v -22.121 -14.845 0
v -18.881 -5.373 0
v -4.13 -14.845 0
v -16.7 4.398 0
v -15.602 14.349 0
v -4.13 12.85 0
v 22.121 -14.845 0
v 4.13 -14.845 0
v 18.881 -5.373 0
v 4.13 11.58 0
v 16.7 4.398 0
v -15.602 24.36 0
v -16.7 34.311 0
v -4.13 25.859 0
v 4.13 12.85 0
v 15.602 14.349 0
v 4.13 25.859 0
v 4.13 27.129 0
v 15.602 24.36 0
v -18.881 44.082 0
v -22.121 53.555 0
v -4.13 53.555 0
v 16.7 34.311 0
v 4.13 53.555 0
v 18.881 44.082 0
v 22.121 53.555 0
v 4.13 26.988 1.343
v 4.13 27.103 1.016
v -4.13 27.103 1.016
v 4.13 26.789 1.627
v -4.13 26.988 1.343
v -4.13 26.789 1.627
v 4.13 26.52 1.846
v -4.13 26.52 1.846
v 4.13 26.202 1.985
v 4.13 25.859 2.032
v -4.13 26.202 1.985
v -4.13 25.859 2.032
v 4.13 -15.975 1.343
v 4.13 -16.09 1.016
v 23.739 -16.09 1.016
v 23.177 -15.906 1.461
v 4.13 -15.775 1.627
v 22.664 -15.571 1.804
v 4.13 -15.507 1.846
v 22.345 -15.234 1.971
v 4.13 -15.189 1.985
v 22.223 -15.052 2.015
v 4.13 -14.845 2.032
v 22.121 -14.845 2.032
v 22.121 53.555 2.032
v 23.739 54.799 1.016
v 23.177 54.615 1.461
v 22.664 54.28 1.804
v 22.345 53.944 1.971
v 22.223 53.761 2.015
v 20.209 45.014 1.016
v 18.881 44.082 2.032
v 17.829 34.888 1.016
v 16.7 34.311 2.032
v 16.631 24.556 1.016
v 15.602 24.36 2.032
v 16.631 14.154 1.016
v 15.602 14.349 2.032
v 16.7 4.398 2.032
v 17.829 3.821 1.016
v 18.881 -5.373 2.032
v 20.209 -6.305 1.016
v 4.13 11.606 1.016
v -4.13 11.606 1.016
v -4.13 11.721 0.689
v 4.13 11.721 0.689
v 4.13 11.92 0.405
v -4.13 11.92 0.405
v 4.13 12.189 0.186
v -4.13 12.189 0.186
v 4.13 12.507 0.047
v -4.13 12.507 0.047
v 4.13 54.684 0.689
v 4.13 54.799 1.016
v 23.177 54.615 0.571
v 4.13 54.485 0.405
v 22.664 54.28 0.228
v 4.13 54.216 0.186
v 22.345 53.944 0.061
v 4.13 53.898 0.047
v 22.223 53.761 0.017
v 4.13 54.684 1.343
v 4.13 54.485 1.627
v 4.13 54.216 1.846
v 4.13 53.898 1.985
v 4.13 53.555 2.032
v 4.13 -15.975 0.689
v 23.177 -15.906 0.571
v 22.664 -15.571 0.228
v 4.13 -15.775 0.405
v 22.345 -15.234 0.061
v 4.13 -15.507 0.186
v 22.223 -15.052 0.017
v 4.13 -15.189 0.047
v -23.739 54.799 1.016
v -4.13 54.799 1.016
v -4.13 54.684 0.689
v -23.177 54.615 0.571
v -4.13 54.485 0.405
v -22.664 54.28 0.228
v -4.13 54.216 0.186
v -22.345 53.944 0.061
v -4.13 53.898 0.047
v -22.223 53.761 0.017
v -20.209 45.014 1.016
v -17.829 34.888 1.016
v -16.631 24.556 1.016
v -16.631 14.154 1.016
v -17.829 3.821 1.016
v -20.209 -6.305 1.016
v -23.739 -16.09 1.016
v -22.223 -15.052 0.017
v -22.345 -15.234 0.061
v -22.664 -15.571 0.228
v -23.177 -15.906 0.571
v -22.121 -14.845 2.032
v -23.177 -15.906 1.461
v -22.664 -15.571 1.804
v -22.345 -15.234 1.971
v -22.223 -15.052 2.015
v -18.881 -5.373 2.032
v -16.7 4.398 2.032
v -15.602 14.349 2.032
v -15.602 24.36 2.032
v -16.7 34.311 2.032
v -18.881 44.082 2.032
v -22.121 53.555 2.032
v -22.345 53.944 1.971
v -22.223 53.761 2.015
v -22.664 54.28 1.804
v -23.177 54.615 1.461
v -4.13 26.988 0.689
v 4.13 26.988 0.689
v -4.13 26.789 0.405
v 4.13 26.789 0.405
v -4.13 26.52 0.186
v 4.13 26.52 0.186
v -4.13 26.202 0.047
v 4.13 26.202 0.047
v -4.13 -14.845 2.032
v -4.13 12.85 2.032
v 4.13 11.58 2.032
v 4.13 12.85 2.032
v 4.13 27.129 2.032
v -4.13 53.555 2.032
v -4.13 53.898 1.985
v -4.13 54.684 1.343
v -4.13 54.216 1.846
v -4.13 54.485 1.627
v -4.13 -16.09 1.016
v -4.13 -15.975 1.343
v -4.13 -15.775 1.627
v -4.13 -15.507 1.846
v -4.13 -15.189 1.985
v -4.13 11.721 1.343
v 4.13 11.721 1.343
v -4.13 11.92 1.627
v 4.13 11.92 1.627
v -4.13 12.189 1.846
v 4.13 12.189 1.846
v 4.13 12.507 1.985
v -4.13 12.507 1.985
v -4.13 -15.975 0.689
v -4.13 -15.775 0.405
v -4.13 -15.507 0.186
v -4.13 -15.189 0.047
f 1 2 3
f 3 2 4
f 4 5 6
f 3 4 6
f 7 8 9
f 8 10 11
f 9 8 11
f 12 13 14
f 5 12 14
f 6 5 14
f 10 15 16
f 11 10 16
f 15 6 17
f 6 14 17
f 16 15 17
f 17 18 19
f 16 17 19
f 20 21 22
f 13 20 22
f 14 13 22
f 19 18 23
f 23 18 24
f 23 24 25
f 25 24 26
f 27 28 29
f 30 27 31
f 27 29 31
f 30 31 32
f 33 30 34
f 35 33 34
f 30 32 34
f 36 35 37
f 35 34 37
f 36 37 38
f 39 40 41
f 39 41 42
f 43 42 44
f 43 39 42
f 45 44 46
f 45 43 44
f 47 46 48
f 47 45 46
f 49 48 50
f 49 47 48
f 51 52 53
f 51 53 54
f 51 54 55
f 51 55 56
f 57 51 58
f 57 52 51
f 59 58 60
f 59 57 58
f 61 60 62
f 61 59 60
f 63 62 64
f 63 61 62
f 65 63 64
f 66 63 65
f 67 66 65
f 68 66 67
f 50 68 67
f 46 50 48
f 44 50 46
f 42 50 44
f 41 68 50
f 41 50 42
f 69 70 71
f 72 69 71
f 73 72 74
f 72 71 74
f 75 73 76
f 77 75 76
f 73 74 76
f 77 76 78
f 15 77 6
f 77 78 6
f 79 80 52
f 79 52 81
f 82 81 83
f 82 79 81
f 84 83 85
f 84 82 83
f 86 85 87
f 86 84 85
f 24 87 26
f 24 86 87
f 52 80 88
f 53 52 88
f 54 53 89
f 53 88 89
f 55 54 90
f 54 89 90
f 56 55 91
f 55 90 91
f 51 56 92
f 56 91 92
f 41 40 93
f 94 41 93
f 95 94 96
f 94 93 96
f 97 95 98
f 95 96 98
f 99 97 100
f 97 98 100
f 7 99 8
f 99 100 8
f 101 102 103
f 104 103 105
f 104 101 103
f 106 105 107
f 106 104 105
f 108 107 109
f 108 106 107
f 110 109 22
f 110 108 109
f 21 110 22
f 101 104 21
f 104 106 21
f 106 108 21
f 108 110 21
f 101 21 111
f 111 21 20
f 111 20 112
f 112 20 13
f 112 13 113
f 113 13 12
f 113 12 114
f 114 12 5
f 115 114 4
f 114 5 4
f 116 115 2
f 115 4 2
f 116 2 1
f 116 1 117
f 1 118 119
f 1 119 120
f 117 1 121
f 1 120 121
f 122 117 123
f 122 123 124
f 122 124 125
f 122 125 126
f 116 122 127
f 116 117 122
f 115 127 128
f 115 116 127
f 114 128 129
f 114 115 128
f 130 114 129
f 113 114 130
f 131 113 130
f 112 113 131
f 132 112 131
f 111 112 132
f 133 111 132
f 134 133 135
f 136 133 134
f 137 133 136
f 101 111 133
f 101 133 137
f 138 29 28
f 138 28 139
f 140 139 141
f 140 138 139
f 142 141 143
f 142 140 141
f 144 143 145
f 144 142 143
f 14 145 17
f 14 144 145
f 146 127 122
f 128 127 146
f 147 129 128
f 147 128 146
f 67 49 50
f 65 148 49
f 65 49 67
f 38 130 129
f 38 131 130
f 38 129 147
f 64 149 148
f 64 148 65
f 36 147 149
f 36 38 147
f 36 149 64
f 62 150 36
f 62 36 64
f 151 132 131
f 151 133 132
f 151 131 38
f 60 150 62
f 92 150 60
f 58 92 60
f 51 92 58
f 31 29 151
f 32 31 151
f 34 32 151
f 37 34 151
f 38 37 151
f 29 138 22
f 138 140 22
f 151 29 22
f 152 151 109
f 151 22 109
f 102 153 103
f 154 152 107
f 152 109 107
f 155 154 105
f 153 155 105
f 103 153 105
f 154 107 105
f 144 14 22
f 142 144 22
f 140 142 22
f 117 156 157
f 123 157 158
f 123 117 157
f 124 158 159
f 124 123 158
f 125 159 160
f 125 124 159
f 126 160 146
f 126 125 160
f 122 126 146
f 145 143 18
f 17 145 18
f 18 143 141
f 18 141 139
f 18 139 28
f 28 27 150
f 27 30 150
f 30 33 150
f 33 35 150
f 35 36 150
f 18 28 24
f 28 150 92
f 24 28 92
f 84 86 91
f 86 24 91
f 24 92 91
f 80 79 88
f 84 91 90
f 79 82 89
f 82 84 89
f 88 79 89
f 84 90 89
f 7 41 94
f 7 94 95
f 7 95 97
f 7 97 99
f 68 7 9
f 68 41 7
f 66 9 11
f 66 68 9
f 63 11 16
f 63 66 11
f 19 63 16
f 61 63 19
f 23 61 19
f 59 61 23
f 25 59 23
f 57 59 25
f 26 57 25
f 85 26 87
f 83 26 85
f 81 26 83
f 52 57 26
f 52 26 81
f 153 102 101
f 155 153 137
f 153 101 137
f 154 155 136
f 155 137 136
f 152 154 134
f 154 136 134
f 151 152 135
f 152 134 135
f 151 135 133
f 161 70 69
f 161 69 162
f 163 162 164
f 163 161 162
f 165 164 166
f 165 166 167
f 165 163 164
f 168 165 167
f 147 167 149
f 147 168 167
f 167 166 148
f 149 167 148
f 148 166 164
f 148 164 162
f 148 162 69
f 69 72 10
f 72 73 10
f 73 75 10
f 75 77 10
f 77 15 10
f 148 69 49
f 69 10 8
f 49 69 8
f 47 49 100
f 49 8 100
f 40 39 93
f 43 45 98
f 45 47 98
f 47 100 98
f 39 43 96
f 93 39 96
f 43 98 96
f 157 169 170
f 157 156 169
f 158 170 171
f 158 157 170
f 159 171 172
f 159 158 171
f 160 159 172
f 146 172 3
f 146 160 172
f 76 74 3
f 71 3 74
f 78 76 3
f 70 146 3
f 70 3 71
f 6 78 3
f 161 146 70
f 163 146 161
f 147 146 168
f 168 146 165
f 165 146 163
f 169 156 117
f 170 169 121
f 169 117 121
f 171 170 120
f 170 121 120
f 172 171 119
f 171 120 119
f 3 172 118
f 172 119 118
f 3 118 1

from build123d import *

# Parameters (mm, degrees)
F1_DEPTH    = 2.032
F2_T2_ANGLE = 50.6284103455
F2_T4_ANGLE = 50.6284103455
F2_T6_ANGLE = 50.6284103455
F2_T8_ANGLE = 50.6284103455
F3_T1_DEPTH = 26.2461176682
F3_T3_DEPTH = 24.8658132399
F3_T5_DEPTH = 24.86581324
F3_T7_DEPTH = 26.2461176682
F3_T9_DEPTH = 8.2601420581


# Not quite as in the source:
# - a fillet or chamfer that OpenCascade refuses, or shapes differently, is made with other operations: its cross-section is extruded or revolved along the edge and cut away or added


with BuildPart() as f1:
    # F0 (on Top) → F1 (new body)
    with BuildSketch(Plane.XY):
        with BuildLine():
            Line((-4.1300710291, 54.8246689141), (-24.0261886972, 54.8246689141))
            ThreePointArc((-24.0261886972, 54.8246689141), (-18.5763848247, 37.4605098755), (-16.7346344691, 19.3546451628))
            ThreePointArc((-16.7346344691, 19.3546451628), (-18.5763848247, 1.2487804501), (-24.0261886972, -16.1153785884))
            Line((-24.0261886972, -16.1153785884), (-4.1300710291, -16.1153785884))
            Line((-4.1300710291, -16.1153785884), (-4.1300710291, 11.5803927183))
            Line((-4.1300710291, 11.5803927183), (4.1300710291, 11.5803927183))
            Line((4.1300710291, 11.5803927183), (4.1300710291, -16.1153785884))
            Line((4.1300710291, -16.1153785884), (24.0261886972, -16.1153785884))
            ThreePointArc((24.0261886972, -16.1153785884), (18.5763848247, 1.2487804501), (16.7346344691, 19.3546451628))
            ThreePointArc((16.7346344691, 19.3546451628), (18.5763848247, 37.4605098755), (24.0261886972, 54.8246689141))
            Line((24.0261886972, 54.8246689141), (4.1300710291, 54.8246689141))
            Line((4.1300710291, 54.8246689141), (4.1300710291, 27.1288976073))
            Line((4.1300710291, 27.1288976073), (-4.1300710291, 27.1288976073))
            Line((-4.1300710291, 27.1288976073), (-4.1300710291, 54.8246689141))
        make_face()
    extrude(amount=F1_DEPTH)

    # F2: chamfer of 1.27 on 4 edges, made by hand

    # F2_s1 → F2_t2 (revolve, cut)
    with BuildSketch(Plane(origin=(26.9800180079, 57.0400631379, 0), x_dir=(0, 0, 1), z_dir=(0.4275819968, 0.9039765683, 0))):
        Polygon((2.032, -3.0522508854), (0.762, -1.7822508854), (2.032, -1.7822508854), align=None)
    revolve(axis=Axis((106.6530048847, 19.3546451628, 2.032), (0, 0, 1)), revolution_arc=F2_T2_ANGLE, mode=Mode.SUBTRACT)

    # F2_s3 → F2_t4 (revolve, cut)
    with BuildSketch(Plane(origin=(12.017944167, -25.4078516136, 0), x_dir=(0, 0, 1), z_dir=(0.4275819968, -0.9039765683, 0))):
        Polygon((0, -13.499144765), (1.27, -14.769144765), (0, -14.769144765), align=None)
    revolve(axis=Axis((106.6530048847, 19.3546451628, 0), (0, 0, -1)), revolution_arc=F2_T4_ANGLE, mode=Mode.SUBTRACT)

    # F2_s5 → F2_t6 (revolve, cut)
    with BuildSketch(Plane(origin=(-12.017944167, -25.4078516136, 0), x_dir=(0, 0, 1), z_dir=(-0.4275819968, -0.9039765683, 0))):
        Polygon((2.032, 13.499144765), (0.762, 14.769144765), (2.032, 14.769144765), align=None)
    revolve(axis=Axis((-106.6530048847, 19.3546451628, 2.032), (0, 0, 1)), revolution_arc=F2_T6_ANGLE, mode=Mode.SUBTRACT)

    # F2_s7 → F2_t8 (revolve, cut)
    with BuildSketch(Plane(origin=(-26.9800180079, 57.0400631379, 0), x_dir=(0, 0, 1), z_dir=(-0.4275819968, 0.9039765683, 0))):
        Polygon((1.27, 1.7822508854), (0, 3.0522508854), (0, 1.7822508854), align=None)
    revolve(axis=Axis((-106.6530048847, 19.3546451628, 0), (0, 0, -1)), revolution_arc=F2_T8_ANGLE, mode=Mode.SUBTRACT)

    # F3: fillet of radius 1.27 on 12 edges, made by hand

    # F3_s2 → F3_t1 (cut)
    with BuildSketch(Plane.YZ.offset(-27.2011886972)):
        with BuildLine():
            ThreePointArc((54.8246689141, 1.27), (54.4526945262, 0.3719743879), (53.5546689141, 0))
            Line((53.5546689141, 0), (54.8246689141, 0))
            Line((54.8246689141, 0), (54.8246689141, 1.27))
        make_face()
        with BuildLine():
            ThreePointArc((-16.1153785884, 1.27), (-15.7434042005, 0.3719743879), (-14.8453785884, 0))
            Line((-14.8453785884, 0), (-16.1153785884, 0))
            Line((-16.1153785884, 0), (-16.1153785884, 1.27))
        make_face()
    extrude(amount=F3_T1_DEPTH, mode=Mode.SUBTRACT)

    # F3_s4 → F3_t3 (cut)
    with BuildSketch(Plane.YZ.offset(-25.820884269)):
        with BuildLine():
            ThreePointArc((54.8246689141, 0.762), (54.4526945262, 1.6600256121), (53.5546689141, 2.032))
            Line((53.5546689141, 2.032), (54.8246689141, 2.032))
            Line((54.8246689141, 2.032), (54.8246689141, 0.762))
        make_face()
        with BuildLine():
            ThreePointArc((-16.1153785884, 0.762), (-15.7434042005, 1.6600256121), (-14.8453785884, 2.032))
            Line((-14.8453785884, 2.032), (-16.1153785884, 2.032))
            Line((-16.1153785884, 2.032), (-16.1153785884, 0.762))
        make_face()
    extrude(amount=F3_T3_DEPTH, mode=Mode.SUBTRACT)

    # F3_s6 → F3_t5 (cut)
    with BuildSketch(Plane.YZ.offset(0.9550710291)):
        with BuildLine():
            ThreePointArc((54.8246689141, 0.762), (54.4526945262, 1.6600256121), (53.5546689141, 2.032))
            Line((53.5546689141, 2.032), (54.8246689141, 2.032))
            Line((54.8246689141, 2.032), (54.8246689141, 0.762))
        make_face()
        with BuildLine():
            ThreePointArc((-16.1153785884, 0.762), (-15.7434042005, 1.6600256121), (-14.8453785884, 2.032))
            Line((-14.8453785884, 2.032), (-16.1153785884, 2.032))
            Line((-16.1153785884, 2.032), (-16.1153785884, 0.762))
        make_face()
    extrude(amount=F3_T5_DEPTH, mode=Mode.SUBTRACT)

    # F3_s8 → F3_t7 (cut)
    with BuildSketch(Plane.YZ.offset(0.9550710291)):
        with BuildLine():
            ThreePointArc((54.8246689141, 1.27), (54.4526945262, 0.3719743879), (53.5546689141, 0))
            Line((53.5546689141, 0), (54.8246689141, 0))
            Line((54.8246689141, 0), (54.8246689141, 1.27))
        make_face()
        with BuildLine():
            ThreePointArc((-16.1153785884, 1.27), (-15.7434042005, 0.3719743879), (-14.8453785884, 0))
            Line((-14.8453785884, 0), (-16.1153785884, 0))
            Line((-16.1153785884, 0), (-16.1153785884, 1.27))
        make_face()
    extrude(amount=F3_T7_DEPTH, mode=Mode.SUBTRACT)

    # F3_s10 → F3_t9 (cut)
    with BuildSketch(Plane.YZ.offset(-4.1300710291)):
        with BuildLine():
            ThreePointArc((11.5803927183, 0.762), (11.9523671062, 1.6600256121), (12.8503927183, 2.032))
            Line((12.8503927183, 2.032), (11.5803927183, 2.032))
            Line((11.5803927183, 2.032), (11.5803927183, 0.762))
        make_face()
        with BuildLine():
            ThreePointArc((11.5803927183, 1.27), (11.9523671062, 0.3719743879), (12.8503927183, 0))
            Line((12.8503927183, 0), (11.5803927183, 0))
            Line((11.5803927183, 0), (11.5803927183, 1.27))
        make_face()
        with BuildLine():
            ThreePointArc((27.1288976073, 1.27), (26.7569232194, 0.3719743879), (25.8588976073, 0))
            Line((25.8588976073, 0), (27.1288976073, 0))
            Line((27.1288976073, 0), (27.1288976073, 1.27))
        make_face()
        with BuildLine():
            ThreePointArc((27.1288976073, 0.762), (26.7569232194, 1.6600256121), (25.8588976073, 2.032))
            Line((25.8588976073, 2.032), (27.1288976073, 2.032))
            Line((27.1288976073, 2.032), (27.1288976073, 0.762))
        make_face()
    extrude(amount=F3_T9_DEPTH, mode=Mode.SUBTRACT)


solid = f1.part
